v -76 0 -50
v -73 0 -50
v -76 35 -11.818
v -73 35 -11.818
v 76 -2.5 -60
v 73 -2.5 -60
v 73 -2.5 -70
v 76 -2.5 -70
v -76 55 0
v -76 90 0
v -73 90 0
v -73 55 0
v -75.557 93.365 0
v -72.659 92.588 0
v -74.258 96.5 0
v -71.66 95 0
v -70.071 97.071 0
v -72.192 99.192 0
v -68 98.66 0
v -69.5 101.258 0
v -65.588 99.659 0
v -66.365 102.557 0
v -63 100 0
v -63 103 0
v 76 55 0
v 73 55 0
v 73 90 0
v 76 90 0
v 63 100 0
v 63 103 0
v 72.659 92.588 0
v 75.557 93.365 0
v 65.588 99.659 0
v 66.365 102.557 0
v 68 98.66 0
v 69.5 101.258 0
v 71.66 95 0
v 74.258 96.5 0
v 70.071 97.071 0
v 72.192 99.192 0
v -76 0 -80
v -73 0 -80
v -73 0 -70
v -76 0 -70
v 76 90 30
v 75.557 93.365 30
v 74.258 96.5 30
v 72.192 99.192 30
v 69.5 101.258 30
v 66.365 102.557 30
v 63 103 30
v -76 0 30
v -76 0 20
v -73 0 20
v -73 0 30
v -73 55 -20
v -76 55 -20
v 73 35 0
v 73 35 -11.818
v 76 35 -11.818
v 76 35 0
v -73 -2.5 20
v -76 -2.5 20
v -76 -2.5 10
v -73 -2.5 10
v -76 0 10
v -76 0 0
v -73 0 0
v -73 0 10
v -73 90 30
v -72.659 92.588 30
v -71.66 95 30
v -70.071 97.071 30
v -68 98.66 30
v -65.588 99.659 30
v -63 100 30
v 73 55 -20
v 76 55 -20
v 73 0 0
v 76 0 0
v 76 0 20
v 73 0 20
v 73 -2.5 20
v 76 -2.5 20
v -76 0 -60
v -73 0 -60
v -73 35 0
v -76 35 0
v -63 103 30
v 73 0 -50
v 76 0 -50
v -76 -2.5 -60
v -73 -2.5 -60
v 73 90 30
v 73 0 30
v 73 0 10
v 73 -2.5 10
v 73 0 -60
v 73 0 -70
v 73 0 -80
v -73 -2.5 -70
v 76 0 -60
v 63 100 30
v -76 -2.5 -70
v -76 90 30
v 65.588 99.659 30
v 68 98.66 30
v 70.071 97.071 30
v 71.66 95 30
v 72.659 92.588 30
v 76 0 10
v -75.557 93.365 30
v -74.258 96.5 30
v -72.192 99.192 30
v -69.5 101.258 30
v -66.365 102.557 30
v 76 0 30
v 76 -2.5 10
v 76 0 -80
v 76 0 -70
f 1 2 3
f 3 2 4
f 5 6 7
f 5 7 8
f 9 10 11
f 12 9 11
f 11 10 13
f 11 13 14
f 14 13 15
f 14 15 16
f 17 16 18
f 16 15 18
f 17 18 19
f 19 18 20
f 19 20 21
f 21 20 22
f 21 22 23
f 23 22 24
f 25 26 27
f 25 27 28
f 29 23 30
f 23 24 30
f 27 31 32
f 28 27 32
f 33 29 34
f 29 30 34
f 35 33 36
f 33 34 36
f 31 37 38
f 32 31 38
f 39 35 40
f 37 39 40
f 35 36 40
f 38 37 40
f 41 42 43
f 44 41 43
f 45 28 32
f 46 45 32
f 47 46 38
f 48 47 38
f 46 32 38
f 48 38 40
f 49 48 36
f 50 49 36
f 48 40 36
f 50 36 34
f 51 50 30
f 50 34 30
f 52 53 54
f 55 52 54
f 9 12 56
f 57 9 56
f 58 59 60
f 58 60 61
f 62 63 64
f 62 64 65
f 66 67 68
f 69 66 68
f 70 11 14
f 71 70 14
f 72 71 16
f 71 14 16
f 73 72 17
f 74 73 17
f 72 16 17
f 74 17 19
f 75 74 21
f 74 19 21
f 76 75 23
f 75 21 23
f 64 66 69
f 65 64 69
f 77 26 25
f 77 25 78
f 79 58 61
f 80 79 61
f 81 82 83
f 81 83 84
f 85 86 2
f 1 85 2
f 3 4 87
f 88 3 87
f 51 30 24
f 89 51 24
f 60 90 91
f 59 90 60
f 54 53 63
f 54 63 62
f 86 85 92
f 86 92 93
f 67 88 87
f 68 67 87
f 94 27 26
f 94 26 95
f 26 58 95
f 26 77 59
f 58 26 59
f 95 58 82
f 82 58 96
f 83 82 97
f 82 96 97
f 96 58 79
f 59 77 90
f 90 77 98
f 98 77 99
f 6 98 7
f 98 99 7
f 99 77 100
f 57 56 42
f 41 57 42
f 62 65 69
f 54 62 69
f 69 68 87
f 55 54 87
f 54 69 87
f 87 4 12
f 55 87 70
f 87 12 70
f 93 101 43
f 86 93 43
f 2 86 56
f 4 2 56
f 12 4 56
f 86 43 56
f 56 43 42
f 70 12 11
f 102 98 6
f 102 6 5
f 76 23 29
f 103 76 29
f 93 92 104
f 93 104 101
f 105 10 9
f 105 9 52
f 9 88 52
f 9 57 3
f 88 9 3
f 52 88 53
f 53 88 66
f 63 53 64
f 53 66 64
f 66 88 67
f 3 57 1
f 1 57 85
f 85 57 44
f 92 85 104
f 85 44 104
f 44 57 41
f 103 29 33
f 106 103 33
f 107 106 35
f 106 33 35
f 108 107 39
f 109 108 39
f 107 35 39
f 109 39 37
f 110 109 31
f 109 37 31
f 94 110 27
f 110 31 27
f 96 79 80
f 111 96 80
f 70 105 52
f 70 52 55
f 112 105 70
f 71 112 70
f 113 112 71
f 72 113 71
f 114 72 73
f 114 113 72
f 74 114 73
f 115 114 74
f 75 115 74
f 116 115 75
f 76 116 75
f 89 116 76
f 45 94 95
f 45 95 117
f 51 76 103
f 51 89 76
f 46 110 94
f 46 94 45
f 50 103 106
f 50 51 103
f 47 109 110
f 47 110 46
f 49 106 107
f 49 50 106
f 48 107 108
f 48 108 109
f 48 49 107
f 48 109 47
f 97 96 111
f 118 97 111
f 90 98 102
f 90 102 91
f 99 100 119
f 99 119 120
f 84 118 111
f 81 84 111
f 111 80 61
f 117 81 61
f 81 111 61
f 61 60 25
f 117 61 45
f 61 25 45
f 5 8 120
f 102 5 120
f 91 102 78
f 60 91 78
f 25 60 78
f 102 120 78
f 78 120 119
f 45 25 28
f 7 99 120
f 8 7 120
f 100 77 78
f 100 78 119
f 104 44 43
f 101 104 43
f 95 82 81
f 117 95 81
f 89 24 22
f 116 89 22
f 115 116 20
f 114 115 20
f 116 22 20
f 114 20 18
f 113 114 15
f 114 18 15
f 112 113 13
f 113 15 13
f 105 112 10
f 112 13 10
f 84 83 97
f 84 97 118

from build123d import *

# Parameters (mm, degrees)
BOSS_EXTRUDE1_DEPTH = 30
BOSS_EXTRUDE2_START = 73
BOSS_EXTRUDE2_DEPTH = 3
SKETCH3_W           = 3
SKETCH3_H           = 10
BOSS_EXTRUDE3_DEPTH = 2.5


with BuildPart() as part:
    # Sketch1 → Boss-Extrude1 (new body)
    with BuildSketch(Plane.XY):
        with BuildLine():
            Line((-73, 0), (-73, 90))
            ThreePointArc((-73, 90), (-70.071067812, 97.071067812), (-63, 100))
            Line((-63, 100), (63, 100))
            ThreePointArc((63, 100), (70.071067812, 97.071067812), (73, 90))
            Line((73, 90), (73, 0))
            Line((73, 0), (76, 0))
            Line((76, 0), (76, 90))
            ThreePointArc((76, 90), (72.192388155, 99.192388155), (63, 103))
            Line((63, 103), (-63, 103))
            ThreePointArc((-63, 103), (-72.192388155, 99.192388155), (-76, 90))
            Line((-76, 90), (-76, 0))
            Line((-76, 0), (-73, 0))
        make_face()
    extrude(amount=BOSS_EXTRUDE1_DEPTH)

    # Sketch2 → Boss-Extrude2 (add)
    with BuildSketch(Plane(origin=(0, 0, 0), x_dir=(0, 0, -1), z_dir=(1, 0, 0)).offset(BOSS_EXTRUDE2_START)):
        Polygon((0, 55), (20, 55), (80, 0), (50, 0), (11.818181818, 35), (0, 35), align=None)
    boss_extrude2 = extrude(amount=BOSS_EXTRUDE2_DEPTH)

    # Mirror1: Boss-Extrude2 across plane
    add(boss_extrude2.mirror(Plane(origin=(0, 0, 0), x_dir=(0, 0, 1), z_dir=(1, 0, 0))))

    # Sketch3 → Boss-Extrude3 (add)
    with BuildSketch(Plane.XZ):
        with Locations((-74.5, 15)):
            Rectangle(SKETCH3_W, SKETCH3_H)
        with Locations((-74.5, -65)):
            Rectangle(SKETCH3_W, SKETCH3_H)
        with Locations((74.5, -65)):
            Rectangle(SKETCH3_W, SKETCH3_H)
        with Locations((74.5, 15)):
            Rectangle(SKETCH3_W, SKETCH3_H)
    extrude(amount=BOSS_EXTRUDE3_DEPTH)


solid = part.part
